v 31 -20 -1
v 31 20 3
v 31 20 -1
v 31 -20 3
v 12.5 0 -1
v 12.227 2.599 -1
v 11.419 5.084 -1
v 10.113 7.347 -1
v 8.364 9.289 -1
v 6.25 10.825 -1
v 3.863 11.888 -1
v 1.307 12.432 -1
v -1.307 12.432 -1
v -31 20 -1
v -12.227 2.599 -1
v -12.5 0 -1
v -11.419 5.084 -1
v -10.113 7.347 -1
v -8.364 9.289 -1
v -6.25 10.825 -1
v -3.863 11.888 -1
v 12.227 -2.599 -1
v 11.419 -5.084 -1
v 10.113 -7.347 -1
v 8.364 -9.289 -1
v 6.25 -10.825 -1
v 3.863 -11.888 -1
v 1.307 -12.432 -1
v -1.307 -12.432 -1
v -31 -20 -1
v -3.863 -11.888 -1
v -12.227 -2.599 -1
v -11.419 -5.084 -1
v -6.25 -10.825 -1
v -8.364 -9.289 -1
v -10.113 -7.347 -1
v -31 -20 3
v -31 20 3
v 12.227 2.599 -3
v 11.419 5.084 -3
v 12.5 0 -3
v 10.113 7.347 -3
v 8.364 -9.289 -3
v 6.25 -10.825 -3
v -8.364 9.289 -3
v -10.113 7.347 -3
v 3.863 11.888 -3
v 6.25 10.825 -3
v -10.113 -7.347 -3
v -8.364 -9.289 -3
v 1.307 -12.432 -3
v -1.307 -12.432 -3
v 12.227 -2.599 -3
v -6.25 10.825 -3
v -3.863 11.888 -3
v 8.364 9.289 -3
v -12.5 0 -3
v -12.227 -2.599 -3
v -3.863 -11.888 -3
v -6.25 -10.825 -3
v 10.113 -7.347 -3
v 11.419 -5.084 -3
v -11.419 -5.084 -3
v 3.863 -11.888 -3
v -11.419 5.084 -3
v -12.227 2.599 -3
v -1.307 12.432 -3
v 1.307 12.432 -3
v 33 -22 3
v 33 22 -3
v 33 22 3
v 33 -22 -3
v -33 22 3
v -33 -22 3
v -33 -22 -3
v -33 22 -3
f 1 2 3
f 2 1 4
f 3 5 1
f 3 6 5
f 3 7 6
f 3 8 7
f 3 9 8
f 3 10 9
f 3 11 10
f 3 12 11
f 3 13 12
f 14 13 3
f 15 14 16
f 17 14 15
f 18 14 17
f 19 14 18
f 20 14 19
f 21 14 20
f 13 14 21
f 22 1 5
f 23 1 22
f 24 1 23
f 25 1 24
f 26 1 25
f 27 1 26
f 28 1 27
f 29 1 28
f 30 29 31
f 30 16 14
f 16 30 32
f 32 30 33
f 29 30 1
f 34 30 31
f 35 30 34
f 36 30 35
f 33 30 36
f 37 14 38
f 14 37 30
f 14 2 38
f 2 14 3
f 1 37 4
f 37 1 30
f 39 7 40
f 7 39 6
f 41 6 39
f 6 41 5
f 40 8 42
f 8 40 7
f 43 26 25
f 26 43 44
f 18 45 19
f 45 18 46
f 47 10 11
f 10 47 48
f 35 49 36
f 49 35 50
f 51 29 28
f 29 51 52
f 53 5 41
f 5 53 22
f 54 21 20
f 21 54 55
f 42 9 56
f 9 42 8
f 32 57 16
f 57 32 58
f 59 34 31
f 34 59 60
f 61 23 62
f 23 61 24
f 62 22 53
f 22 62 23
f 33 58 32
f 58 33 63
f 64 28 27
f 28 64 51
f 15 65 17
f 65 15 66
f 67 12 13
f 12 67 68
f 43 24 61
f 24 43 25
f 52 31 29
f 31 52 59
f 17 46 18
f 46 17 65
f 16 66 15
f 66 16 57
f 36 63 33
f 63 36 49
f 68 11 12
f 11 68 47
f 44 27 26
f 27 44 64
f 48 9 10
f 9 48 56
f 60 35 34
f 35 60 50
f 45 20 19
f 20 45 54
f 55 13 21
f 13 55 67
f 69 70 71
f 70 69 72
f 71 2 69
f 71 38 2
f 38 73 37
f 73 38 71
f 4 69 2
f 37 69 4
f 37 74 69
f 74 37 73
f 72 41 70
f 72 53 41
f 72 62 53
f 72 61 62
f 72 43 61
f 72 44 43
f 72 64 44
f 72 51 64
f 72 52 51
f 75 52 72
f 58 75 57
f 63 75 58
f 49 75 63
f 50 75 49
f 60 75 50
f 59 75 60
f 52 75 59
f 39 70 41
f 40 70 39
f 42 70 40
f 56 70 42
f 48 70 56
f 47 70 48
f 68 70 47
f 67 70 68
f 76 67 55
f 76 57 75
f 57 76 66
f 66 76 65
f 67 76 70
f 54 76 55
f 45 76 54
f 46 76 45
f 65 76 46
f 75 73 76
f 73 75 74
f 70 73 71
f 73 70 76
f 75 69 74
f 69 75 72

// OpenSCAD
difference()
{
    cube([66,44,6], center=true);
    union()
    {   
        translate([0,0,2])
            cube([62,40,6], center=true);
        cylinder(8, d=25, center=true);
    }
}
